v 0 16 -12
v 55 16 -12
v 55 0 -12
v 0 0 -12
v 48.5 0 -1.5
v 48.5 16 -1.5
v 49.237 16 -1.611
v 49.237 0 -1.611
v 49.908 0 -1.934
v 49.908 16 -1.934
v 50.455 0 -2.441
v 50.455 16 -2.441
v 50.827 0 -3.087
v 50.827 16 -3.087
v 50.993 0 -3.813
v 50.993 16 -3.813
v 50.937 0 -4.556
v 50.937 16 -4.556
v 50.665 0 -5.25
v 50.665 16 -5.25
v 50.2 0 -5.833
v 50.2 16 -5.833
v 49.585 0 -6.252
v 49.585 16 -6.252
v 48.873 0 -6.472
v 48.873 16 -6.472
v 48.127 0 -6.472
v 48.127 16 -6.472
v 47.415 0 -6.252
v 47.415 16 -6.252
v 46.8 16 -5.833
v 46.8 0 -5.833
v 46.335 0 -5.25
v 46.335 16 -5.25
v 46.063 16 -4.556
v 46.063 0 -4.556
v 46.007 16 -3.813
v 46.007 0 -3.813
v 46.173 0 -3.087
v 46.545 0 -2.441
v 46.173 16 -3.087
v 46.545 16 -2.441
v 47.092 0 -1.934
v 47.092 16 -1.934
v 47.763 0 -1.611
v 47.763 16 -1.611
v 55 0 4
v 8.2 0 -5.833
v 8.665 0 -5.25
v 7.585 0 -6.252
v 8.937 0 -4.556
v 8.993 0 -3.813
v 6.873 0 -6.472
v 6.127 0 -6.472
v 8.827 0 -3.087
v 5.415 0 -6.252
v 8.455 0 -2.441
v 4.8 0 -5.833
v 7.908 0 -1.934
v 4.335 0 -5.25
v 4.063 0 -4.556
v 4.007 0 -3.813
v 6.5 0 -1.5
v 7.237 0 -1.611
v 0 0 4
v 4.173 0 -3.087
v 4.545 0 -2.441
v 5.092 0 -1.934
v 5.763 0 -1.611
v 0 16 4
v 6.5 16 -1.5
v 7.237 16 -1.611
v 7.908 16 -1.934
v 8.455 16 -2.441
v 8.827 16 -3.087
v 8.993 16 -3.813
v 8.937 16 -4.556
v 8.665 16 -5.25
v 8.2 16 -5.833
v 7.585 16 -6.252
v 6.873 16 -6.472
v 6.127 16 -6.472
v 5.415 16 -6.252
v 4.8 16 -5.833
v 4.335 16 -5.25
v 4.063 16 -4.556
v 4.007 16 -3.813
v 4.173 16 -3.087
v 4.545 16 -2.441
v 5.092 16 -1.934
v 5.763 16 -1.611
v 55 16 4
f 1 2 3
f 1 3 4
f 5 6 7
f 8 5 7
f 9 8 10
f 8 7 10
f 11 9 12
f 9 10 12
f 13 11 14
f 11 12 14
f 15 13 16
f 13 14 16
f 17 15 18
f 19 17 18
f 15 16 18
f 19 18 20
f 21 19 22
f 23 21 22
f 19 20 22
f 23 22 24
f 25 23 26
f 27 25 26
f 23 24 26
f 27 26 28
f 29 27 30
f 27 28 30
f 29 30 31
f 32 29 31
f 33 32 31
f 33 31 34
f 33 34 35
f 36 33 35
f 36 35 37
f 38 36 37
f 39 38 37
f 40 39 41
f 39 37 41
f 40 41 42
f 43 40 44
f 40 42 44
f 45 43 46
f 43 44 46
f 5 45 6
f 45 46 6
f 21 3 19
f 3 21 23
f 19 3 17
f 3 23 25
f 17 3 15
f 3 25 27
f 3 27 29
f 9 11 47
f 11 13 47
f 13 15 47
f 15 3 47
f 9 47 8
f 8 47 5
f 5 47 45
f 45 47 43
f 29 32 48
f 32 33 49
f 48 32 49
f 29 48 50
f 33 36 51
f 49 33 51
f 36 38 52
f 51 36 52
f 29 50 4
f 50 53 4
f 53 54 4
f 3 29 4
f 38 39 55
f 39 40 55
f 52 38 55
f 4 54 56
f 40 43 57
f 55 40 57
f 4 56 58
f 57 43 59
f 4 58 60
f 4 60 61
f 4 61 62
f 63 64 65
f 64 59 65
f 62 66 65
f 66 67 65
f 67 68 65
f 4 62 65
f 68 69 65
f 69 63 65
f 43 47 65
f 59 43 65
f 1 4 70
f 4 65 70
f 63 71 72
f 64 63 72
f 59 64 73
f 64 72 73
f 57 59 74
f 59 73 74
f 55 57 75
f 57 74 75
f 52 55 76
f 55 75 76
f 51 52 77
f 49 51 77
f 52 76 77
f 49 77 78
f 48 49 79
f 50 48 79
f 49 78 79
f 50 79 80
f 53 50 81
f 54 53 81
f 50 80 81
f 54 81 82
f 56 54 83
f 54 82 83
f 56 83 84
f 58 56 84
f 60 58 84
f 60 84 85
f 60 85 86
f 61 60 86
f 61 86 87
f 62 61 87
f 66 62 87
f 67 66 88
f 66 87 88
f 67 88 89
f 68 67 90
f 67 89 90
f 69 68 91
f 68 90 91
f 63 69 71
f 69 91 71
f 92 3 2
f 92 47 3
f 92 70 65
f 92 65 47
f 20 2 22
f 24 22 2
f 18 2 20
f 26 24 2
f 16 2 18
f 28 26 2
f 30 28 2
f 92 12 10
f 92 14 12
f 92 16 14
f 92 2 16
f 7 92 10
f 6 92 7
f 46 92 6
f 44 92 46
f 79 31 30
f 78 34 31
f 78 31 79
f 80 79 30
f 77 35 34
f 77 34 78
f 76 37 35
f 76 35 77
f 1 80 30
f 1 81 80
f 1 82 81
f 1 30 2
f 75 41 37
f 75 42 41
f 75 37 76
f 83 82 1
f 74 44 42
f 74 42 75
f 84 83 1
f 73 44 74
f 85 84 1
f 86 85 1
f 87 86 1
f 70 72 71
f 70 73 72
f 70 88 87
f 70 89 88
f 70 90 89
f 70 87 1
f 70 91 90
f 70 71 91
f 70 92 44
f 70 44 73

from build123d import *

# Parameters (mm, degrees)
SKETCH1_W           = 55
SKETCH1_H           = 8
BOSS_EXTRUDE1_DEPTH = 16
SKETCH2_R           = 2.5
CUT_EXTRUDE1_DEPTH  = 16
SKETCH3_W           = 55
SKETCH3_H           = 16
BOSS_EXTRUDE2_DEPTH = 4
SKETCH4_W           = 55
SKETCH4_H           = 16
BOSS_EXTRUDE3_DEPTH = 4


with BuildPart() as part:
    # Sketch1 → Boss-Extrude1 (new body)
    with BuildSketch(Plane(origin=(0, 0, 0), x_dir=(1, 0, 0), z_dir=(0, 1, 0))):
        with Locations((27.5, 4)):
            Rectangle(SKETCH1_W, SKETCH1_H)
    extrude(amount=BOSS_EXTRUDE1_DEPTH)

    # Sketch2 → Cut-Extrude1 (cut)
    with BuildSketch(Plane(origin=(0, 16, 0), x_dir=(1, 0, 0), z_dir=(0, 1, 0))):
        with Locations(Location((6.5, 4, 0), (0, 0, 270))):
            Circle(SKETCH2_R)
        with Locations(Location((48.5, 4, 0), (0, 0, 270))):
            Circle(SKETCH2_R)
    extrude(amount=-CUT_EXTRUDE1_DEPTH, mode=Mode.SUBTRACT)

    # Sketch3 → Boss-Extrude2 (add)
    with BuildSketch(Plane.XY):
        with Locations((27.5, 8)):
            Rectangle(SKETCH3_W, SKETCH3_H)
    extrude(amount=BOSS_EXTRUDE2_DEPTH)

    # Sketch4 → Boss-Extrude3 (add)
    with BuildSketch(Plane(origin=(0, 0, -8), x_dir=(-1, 0, 0), z_dir=(0, 0, -1))):
        with Locations((-27.5, 8)):
            Rectangle(SKETCH4_W, SKETCH4_H)
    extrude(amount=BOSS_EXTRUDE3_DEPTH)


solid = part.part
